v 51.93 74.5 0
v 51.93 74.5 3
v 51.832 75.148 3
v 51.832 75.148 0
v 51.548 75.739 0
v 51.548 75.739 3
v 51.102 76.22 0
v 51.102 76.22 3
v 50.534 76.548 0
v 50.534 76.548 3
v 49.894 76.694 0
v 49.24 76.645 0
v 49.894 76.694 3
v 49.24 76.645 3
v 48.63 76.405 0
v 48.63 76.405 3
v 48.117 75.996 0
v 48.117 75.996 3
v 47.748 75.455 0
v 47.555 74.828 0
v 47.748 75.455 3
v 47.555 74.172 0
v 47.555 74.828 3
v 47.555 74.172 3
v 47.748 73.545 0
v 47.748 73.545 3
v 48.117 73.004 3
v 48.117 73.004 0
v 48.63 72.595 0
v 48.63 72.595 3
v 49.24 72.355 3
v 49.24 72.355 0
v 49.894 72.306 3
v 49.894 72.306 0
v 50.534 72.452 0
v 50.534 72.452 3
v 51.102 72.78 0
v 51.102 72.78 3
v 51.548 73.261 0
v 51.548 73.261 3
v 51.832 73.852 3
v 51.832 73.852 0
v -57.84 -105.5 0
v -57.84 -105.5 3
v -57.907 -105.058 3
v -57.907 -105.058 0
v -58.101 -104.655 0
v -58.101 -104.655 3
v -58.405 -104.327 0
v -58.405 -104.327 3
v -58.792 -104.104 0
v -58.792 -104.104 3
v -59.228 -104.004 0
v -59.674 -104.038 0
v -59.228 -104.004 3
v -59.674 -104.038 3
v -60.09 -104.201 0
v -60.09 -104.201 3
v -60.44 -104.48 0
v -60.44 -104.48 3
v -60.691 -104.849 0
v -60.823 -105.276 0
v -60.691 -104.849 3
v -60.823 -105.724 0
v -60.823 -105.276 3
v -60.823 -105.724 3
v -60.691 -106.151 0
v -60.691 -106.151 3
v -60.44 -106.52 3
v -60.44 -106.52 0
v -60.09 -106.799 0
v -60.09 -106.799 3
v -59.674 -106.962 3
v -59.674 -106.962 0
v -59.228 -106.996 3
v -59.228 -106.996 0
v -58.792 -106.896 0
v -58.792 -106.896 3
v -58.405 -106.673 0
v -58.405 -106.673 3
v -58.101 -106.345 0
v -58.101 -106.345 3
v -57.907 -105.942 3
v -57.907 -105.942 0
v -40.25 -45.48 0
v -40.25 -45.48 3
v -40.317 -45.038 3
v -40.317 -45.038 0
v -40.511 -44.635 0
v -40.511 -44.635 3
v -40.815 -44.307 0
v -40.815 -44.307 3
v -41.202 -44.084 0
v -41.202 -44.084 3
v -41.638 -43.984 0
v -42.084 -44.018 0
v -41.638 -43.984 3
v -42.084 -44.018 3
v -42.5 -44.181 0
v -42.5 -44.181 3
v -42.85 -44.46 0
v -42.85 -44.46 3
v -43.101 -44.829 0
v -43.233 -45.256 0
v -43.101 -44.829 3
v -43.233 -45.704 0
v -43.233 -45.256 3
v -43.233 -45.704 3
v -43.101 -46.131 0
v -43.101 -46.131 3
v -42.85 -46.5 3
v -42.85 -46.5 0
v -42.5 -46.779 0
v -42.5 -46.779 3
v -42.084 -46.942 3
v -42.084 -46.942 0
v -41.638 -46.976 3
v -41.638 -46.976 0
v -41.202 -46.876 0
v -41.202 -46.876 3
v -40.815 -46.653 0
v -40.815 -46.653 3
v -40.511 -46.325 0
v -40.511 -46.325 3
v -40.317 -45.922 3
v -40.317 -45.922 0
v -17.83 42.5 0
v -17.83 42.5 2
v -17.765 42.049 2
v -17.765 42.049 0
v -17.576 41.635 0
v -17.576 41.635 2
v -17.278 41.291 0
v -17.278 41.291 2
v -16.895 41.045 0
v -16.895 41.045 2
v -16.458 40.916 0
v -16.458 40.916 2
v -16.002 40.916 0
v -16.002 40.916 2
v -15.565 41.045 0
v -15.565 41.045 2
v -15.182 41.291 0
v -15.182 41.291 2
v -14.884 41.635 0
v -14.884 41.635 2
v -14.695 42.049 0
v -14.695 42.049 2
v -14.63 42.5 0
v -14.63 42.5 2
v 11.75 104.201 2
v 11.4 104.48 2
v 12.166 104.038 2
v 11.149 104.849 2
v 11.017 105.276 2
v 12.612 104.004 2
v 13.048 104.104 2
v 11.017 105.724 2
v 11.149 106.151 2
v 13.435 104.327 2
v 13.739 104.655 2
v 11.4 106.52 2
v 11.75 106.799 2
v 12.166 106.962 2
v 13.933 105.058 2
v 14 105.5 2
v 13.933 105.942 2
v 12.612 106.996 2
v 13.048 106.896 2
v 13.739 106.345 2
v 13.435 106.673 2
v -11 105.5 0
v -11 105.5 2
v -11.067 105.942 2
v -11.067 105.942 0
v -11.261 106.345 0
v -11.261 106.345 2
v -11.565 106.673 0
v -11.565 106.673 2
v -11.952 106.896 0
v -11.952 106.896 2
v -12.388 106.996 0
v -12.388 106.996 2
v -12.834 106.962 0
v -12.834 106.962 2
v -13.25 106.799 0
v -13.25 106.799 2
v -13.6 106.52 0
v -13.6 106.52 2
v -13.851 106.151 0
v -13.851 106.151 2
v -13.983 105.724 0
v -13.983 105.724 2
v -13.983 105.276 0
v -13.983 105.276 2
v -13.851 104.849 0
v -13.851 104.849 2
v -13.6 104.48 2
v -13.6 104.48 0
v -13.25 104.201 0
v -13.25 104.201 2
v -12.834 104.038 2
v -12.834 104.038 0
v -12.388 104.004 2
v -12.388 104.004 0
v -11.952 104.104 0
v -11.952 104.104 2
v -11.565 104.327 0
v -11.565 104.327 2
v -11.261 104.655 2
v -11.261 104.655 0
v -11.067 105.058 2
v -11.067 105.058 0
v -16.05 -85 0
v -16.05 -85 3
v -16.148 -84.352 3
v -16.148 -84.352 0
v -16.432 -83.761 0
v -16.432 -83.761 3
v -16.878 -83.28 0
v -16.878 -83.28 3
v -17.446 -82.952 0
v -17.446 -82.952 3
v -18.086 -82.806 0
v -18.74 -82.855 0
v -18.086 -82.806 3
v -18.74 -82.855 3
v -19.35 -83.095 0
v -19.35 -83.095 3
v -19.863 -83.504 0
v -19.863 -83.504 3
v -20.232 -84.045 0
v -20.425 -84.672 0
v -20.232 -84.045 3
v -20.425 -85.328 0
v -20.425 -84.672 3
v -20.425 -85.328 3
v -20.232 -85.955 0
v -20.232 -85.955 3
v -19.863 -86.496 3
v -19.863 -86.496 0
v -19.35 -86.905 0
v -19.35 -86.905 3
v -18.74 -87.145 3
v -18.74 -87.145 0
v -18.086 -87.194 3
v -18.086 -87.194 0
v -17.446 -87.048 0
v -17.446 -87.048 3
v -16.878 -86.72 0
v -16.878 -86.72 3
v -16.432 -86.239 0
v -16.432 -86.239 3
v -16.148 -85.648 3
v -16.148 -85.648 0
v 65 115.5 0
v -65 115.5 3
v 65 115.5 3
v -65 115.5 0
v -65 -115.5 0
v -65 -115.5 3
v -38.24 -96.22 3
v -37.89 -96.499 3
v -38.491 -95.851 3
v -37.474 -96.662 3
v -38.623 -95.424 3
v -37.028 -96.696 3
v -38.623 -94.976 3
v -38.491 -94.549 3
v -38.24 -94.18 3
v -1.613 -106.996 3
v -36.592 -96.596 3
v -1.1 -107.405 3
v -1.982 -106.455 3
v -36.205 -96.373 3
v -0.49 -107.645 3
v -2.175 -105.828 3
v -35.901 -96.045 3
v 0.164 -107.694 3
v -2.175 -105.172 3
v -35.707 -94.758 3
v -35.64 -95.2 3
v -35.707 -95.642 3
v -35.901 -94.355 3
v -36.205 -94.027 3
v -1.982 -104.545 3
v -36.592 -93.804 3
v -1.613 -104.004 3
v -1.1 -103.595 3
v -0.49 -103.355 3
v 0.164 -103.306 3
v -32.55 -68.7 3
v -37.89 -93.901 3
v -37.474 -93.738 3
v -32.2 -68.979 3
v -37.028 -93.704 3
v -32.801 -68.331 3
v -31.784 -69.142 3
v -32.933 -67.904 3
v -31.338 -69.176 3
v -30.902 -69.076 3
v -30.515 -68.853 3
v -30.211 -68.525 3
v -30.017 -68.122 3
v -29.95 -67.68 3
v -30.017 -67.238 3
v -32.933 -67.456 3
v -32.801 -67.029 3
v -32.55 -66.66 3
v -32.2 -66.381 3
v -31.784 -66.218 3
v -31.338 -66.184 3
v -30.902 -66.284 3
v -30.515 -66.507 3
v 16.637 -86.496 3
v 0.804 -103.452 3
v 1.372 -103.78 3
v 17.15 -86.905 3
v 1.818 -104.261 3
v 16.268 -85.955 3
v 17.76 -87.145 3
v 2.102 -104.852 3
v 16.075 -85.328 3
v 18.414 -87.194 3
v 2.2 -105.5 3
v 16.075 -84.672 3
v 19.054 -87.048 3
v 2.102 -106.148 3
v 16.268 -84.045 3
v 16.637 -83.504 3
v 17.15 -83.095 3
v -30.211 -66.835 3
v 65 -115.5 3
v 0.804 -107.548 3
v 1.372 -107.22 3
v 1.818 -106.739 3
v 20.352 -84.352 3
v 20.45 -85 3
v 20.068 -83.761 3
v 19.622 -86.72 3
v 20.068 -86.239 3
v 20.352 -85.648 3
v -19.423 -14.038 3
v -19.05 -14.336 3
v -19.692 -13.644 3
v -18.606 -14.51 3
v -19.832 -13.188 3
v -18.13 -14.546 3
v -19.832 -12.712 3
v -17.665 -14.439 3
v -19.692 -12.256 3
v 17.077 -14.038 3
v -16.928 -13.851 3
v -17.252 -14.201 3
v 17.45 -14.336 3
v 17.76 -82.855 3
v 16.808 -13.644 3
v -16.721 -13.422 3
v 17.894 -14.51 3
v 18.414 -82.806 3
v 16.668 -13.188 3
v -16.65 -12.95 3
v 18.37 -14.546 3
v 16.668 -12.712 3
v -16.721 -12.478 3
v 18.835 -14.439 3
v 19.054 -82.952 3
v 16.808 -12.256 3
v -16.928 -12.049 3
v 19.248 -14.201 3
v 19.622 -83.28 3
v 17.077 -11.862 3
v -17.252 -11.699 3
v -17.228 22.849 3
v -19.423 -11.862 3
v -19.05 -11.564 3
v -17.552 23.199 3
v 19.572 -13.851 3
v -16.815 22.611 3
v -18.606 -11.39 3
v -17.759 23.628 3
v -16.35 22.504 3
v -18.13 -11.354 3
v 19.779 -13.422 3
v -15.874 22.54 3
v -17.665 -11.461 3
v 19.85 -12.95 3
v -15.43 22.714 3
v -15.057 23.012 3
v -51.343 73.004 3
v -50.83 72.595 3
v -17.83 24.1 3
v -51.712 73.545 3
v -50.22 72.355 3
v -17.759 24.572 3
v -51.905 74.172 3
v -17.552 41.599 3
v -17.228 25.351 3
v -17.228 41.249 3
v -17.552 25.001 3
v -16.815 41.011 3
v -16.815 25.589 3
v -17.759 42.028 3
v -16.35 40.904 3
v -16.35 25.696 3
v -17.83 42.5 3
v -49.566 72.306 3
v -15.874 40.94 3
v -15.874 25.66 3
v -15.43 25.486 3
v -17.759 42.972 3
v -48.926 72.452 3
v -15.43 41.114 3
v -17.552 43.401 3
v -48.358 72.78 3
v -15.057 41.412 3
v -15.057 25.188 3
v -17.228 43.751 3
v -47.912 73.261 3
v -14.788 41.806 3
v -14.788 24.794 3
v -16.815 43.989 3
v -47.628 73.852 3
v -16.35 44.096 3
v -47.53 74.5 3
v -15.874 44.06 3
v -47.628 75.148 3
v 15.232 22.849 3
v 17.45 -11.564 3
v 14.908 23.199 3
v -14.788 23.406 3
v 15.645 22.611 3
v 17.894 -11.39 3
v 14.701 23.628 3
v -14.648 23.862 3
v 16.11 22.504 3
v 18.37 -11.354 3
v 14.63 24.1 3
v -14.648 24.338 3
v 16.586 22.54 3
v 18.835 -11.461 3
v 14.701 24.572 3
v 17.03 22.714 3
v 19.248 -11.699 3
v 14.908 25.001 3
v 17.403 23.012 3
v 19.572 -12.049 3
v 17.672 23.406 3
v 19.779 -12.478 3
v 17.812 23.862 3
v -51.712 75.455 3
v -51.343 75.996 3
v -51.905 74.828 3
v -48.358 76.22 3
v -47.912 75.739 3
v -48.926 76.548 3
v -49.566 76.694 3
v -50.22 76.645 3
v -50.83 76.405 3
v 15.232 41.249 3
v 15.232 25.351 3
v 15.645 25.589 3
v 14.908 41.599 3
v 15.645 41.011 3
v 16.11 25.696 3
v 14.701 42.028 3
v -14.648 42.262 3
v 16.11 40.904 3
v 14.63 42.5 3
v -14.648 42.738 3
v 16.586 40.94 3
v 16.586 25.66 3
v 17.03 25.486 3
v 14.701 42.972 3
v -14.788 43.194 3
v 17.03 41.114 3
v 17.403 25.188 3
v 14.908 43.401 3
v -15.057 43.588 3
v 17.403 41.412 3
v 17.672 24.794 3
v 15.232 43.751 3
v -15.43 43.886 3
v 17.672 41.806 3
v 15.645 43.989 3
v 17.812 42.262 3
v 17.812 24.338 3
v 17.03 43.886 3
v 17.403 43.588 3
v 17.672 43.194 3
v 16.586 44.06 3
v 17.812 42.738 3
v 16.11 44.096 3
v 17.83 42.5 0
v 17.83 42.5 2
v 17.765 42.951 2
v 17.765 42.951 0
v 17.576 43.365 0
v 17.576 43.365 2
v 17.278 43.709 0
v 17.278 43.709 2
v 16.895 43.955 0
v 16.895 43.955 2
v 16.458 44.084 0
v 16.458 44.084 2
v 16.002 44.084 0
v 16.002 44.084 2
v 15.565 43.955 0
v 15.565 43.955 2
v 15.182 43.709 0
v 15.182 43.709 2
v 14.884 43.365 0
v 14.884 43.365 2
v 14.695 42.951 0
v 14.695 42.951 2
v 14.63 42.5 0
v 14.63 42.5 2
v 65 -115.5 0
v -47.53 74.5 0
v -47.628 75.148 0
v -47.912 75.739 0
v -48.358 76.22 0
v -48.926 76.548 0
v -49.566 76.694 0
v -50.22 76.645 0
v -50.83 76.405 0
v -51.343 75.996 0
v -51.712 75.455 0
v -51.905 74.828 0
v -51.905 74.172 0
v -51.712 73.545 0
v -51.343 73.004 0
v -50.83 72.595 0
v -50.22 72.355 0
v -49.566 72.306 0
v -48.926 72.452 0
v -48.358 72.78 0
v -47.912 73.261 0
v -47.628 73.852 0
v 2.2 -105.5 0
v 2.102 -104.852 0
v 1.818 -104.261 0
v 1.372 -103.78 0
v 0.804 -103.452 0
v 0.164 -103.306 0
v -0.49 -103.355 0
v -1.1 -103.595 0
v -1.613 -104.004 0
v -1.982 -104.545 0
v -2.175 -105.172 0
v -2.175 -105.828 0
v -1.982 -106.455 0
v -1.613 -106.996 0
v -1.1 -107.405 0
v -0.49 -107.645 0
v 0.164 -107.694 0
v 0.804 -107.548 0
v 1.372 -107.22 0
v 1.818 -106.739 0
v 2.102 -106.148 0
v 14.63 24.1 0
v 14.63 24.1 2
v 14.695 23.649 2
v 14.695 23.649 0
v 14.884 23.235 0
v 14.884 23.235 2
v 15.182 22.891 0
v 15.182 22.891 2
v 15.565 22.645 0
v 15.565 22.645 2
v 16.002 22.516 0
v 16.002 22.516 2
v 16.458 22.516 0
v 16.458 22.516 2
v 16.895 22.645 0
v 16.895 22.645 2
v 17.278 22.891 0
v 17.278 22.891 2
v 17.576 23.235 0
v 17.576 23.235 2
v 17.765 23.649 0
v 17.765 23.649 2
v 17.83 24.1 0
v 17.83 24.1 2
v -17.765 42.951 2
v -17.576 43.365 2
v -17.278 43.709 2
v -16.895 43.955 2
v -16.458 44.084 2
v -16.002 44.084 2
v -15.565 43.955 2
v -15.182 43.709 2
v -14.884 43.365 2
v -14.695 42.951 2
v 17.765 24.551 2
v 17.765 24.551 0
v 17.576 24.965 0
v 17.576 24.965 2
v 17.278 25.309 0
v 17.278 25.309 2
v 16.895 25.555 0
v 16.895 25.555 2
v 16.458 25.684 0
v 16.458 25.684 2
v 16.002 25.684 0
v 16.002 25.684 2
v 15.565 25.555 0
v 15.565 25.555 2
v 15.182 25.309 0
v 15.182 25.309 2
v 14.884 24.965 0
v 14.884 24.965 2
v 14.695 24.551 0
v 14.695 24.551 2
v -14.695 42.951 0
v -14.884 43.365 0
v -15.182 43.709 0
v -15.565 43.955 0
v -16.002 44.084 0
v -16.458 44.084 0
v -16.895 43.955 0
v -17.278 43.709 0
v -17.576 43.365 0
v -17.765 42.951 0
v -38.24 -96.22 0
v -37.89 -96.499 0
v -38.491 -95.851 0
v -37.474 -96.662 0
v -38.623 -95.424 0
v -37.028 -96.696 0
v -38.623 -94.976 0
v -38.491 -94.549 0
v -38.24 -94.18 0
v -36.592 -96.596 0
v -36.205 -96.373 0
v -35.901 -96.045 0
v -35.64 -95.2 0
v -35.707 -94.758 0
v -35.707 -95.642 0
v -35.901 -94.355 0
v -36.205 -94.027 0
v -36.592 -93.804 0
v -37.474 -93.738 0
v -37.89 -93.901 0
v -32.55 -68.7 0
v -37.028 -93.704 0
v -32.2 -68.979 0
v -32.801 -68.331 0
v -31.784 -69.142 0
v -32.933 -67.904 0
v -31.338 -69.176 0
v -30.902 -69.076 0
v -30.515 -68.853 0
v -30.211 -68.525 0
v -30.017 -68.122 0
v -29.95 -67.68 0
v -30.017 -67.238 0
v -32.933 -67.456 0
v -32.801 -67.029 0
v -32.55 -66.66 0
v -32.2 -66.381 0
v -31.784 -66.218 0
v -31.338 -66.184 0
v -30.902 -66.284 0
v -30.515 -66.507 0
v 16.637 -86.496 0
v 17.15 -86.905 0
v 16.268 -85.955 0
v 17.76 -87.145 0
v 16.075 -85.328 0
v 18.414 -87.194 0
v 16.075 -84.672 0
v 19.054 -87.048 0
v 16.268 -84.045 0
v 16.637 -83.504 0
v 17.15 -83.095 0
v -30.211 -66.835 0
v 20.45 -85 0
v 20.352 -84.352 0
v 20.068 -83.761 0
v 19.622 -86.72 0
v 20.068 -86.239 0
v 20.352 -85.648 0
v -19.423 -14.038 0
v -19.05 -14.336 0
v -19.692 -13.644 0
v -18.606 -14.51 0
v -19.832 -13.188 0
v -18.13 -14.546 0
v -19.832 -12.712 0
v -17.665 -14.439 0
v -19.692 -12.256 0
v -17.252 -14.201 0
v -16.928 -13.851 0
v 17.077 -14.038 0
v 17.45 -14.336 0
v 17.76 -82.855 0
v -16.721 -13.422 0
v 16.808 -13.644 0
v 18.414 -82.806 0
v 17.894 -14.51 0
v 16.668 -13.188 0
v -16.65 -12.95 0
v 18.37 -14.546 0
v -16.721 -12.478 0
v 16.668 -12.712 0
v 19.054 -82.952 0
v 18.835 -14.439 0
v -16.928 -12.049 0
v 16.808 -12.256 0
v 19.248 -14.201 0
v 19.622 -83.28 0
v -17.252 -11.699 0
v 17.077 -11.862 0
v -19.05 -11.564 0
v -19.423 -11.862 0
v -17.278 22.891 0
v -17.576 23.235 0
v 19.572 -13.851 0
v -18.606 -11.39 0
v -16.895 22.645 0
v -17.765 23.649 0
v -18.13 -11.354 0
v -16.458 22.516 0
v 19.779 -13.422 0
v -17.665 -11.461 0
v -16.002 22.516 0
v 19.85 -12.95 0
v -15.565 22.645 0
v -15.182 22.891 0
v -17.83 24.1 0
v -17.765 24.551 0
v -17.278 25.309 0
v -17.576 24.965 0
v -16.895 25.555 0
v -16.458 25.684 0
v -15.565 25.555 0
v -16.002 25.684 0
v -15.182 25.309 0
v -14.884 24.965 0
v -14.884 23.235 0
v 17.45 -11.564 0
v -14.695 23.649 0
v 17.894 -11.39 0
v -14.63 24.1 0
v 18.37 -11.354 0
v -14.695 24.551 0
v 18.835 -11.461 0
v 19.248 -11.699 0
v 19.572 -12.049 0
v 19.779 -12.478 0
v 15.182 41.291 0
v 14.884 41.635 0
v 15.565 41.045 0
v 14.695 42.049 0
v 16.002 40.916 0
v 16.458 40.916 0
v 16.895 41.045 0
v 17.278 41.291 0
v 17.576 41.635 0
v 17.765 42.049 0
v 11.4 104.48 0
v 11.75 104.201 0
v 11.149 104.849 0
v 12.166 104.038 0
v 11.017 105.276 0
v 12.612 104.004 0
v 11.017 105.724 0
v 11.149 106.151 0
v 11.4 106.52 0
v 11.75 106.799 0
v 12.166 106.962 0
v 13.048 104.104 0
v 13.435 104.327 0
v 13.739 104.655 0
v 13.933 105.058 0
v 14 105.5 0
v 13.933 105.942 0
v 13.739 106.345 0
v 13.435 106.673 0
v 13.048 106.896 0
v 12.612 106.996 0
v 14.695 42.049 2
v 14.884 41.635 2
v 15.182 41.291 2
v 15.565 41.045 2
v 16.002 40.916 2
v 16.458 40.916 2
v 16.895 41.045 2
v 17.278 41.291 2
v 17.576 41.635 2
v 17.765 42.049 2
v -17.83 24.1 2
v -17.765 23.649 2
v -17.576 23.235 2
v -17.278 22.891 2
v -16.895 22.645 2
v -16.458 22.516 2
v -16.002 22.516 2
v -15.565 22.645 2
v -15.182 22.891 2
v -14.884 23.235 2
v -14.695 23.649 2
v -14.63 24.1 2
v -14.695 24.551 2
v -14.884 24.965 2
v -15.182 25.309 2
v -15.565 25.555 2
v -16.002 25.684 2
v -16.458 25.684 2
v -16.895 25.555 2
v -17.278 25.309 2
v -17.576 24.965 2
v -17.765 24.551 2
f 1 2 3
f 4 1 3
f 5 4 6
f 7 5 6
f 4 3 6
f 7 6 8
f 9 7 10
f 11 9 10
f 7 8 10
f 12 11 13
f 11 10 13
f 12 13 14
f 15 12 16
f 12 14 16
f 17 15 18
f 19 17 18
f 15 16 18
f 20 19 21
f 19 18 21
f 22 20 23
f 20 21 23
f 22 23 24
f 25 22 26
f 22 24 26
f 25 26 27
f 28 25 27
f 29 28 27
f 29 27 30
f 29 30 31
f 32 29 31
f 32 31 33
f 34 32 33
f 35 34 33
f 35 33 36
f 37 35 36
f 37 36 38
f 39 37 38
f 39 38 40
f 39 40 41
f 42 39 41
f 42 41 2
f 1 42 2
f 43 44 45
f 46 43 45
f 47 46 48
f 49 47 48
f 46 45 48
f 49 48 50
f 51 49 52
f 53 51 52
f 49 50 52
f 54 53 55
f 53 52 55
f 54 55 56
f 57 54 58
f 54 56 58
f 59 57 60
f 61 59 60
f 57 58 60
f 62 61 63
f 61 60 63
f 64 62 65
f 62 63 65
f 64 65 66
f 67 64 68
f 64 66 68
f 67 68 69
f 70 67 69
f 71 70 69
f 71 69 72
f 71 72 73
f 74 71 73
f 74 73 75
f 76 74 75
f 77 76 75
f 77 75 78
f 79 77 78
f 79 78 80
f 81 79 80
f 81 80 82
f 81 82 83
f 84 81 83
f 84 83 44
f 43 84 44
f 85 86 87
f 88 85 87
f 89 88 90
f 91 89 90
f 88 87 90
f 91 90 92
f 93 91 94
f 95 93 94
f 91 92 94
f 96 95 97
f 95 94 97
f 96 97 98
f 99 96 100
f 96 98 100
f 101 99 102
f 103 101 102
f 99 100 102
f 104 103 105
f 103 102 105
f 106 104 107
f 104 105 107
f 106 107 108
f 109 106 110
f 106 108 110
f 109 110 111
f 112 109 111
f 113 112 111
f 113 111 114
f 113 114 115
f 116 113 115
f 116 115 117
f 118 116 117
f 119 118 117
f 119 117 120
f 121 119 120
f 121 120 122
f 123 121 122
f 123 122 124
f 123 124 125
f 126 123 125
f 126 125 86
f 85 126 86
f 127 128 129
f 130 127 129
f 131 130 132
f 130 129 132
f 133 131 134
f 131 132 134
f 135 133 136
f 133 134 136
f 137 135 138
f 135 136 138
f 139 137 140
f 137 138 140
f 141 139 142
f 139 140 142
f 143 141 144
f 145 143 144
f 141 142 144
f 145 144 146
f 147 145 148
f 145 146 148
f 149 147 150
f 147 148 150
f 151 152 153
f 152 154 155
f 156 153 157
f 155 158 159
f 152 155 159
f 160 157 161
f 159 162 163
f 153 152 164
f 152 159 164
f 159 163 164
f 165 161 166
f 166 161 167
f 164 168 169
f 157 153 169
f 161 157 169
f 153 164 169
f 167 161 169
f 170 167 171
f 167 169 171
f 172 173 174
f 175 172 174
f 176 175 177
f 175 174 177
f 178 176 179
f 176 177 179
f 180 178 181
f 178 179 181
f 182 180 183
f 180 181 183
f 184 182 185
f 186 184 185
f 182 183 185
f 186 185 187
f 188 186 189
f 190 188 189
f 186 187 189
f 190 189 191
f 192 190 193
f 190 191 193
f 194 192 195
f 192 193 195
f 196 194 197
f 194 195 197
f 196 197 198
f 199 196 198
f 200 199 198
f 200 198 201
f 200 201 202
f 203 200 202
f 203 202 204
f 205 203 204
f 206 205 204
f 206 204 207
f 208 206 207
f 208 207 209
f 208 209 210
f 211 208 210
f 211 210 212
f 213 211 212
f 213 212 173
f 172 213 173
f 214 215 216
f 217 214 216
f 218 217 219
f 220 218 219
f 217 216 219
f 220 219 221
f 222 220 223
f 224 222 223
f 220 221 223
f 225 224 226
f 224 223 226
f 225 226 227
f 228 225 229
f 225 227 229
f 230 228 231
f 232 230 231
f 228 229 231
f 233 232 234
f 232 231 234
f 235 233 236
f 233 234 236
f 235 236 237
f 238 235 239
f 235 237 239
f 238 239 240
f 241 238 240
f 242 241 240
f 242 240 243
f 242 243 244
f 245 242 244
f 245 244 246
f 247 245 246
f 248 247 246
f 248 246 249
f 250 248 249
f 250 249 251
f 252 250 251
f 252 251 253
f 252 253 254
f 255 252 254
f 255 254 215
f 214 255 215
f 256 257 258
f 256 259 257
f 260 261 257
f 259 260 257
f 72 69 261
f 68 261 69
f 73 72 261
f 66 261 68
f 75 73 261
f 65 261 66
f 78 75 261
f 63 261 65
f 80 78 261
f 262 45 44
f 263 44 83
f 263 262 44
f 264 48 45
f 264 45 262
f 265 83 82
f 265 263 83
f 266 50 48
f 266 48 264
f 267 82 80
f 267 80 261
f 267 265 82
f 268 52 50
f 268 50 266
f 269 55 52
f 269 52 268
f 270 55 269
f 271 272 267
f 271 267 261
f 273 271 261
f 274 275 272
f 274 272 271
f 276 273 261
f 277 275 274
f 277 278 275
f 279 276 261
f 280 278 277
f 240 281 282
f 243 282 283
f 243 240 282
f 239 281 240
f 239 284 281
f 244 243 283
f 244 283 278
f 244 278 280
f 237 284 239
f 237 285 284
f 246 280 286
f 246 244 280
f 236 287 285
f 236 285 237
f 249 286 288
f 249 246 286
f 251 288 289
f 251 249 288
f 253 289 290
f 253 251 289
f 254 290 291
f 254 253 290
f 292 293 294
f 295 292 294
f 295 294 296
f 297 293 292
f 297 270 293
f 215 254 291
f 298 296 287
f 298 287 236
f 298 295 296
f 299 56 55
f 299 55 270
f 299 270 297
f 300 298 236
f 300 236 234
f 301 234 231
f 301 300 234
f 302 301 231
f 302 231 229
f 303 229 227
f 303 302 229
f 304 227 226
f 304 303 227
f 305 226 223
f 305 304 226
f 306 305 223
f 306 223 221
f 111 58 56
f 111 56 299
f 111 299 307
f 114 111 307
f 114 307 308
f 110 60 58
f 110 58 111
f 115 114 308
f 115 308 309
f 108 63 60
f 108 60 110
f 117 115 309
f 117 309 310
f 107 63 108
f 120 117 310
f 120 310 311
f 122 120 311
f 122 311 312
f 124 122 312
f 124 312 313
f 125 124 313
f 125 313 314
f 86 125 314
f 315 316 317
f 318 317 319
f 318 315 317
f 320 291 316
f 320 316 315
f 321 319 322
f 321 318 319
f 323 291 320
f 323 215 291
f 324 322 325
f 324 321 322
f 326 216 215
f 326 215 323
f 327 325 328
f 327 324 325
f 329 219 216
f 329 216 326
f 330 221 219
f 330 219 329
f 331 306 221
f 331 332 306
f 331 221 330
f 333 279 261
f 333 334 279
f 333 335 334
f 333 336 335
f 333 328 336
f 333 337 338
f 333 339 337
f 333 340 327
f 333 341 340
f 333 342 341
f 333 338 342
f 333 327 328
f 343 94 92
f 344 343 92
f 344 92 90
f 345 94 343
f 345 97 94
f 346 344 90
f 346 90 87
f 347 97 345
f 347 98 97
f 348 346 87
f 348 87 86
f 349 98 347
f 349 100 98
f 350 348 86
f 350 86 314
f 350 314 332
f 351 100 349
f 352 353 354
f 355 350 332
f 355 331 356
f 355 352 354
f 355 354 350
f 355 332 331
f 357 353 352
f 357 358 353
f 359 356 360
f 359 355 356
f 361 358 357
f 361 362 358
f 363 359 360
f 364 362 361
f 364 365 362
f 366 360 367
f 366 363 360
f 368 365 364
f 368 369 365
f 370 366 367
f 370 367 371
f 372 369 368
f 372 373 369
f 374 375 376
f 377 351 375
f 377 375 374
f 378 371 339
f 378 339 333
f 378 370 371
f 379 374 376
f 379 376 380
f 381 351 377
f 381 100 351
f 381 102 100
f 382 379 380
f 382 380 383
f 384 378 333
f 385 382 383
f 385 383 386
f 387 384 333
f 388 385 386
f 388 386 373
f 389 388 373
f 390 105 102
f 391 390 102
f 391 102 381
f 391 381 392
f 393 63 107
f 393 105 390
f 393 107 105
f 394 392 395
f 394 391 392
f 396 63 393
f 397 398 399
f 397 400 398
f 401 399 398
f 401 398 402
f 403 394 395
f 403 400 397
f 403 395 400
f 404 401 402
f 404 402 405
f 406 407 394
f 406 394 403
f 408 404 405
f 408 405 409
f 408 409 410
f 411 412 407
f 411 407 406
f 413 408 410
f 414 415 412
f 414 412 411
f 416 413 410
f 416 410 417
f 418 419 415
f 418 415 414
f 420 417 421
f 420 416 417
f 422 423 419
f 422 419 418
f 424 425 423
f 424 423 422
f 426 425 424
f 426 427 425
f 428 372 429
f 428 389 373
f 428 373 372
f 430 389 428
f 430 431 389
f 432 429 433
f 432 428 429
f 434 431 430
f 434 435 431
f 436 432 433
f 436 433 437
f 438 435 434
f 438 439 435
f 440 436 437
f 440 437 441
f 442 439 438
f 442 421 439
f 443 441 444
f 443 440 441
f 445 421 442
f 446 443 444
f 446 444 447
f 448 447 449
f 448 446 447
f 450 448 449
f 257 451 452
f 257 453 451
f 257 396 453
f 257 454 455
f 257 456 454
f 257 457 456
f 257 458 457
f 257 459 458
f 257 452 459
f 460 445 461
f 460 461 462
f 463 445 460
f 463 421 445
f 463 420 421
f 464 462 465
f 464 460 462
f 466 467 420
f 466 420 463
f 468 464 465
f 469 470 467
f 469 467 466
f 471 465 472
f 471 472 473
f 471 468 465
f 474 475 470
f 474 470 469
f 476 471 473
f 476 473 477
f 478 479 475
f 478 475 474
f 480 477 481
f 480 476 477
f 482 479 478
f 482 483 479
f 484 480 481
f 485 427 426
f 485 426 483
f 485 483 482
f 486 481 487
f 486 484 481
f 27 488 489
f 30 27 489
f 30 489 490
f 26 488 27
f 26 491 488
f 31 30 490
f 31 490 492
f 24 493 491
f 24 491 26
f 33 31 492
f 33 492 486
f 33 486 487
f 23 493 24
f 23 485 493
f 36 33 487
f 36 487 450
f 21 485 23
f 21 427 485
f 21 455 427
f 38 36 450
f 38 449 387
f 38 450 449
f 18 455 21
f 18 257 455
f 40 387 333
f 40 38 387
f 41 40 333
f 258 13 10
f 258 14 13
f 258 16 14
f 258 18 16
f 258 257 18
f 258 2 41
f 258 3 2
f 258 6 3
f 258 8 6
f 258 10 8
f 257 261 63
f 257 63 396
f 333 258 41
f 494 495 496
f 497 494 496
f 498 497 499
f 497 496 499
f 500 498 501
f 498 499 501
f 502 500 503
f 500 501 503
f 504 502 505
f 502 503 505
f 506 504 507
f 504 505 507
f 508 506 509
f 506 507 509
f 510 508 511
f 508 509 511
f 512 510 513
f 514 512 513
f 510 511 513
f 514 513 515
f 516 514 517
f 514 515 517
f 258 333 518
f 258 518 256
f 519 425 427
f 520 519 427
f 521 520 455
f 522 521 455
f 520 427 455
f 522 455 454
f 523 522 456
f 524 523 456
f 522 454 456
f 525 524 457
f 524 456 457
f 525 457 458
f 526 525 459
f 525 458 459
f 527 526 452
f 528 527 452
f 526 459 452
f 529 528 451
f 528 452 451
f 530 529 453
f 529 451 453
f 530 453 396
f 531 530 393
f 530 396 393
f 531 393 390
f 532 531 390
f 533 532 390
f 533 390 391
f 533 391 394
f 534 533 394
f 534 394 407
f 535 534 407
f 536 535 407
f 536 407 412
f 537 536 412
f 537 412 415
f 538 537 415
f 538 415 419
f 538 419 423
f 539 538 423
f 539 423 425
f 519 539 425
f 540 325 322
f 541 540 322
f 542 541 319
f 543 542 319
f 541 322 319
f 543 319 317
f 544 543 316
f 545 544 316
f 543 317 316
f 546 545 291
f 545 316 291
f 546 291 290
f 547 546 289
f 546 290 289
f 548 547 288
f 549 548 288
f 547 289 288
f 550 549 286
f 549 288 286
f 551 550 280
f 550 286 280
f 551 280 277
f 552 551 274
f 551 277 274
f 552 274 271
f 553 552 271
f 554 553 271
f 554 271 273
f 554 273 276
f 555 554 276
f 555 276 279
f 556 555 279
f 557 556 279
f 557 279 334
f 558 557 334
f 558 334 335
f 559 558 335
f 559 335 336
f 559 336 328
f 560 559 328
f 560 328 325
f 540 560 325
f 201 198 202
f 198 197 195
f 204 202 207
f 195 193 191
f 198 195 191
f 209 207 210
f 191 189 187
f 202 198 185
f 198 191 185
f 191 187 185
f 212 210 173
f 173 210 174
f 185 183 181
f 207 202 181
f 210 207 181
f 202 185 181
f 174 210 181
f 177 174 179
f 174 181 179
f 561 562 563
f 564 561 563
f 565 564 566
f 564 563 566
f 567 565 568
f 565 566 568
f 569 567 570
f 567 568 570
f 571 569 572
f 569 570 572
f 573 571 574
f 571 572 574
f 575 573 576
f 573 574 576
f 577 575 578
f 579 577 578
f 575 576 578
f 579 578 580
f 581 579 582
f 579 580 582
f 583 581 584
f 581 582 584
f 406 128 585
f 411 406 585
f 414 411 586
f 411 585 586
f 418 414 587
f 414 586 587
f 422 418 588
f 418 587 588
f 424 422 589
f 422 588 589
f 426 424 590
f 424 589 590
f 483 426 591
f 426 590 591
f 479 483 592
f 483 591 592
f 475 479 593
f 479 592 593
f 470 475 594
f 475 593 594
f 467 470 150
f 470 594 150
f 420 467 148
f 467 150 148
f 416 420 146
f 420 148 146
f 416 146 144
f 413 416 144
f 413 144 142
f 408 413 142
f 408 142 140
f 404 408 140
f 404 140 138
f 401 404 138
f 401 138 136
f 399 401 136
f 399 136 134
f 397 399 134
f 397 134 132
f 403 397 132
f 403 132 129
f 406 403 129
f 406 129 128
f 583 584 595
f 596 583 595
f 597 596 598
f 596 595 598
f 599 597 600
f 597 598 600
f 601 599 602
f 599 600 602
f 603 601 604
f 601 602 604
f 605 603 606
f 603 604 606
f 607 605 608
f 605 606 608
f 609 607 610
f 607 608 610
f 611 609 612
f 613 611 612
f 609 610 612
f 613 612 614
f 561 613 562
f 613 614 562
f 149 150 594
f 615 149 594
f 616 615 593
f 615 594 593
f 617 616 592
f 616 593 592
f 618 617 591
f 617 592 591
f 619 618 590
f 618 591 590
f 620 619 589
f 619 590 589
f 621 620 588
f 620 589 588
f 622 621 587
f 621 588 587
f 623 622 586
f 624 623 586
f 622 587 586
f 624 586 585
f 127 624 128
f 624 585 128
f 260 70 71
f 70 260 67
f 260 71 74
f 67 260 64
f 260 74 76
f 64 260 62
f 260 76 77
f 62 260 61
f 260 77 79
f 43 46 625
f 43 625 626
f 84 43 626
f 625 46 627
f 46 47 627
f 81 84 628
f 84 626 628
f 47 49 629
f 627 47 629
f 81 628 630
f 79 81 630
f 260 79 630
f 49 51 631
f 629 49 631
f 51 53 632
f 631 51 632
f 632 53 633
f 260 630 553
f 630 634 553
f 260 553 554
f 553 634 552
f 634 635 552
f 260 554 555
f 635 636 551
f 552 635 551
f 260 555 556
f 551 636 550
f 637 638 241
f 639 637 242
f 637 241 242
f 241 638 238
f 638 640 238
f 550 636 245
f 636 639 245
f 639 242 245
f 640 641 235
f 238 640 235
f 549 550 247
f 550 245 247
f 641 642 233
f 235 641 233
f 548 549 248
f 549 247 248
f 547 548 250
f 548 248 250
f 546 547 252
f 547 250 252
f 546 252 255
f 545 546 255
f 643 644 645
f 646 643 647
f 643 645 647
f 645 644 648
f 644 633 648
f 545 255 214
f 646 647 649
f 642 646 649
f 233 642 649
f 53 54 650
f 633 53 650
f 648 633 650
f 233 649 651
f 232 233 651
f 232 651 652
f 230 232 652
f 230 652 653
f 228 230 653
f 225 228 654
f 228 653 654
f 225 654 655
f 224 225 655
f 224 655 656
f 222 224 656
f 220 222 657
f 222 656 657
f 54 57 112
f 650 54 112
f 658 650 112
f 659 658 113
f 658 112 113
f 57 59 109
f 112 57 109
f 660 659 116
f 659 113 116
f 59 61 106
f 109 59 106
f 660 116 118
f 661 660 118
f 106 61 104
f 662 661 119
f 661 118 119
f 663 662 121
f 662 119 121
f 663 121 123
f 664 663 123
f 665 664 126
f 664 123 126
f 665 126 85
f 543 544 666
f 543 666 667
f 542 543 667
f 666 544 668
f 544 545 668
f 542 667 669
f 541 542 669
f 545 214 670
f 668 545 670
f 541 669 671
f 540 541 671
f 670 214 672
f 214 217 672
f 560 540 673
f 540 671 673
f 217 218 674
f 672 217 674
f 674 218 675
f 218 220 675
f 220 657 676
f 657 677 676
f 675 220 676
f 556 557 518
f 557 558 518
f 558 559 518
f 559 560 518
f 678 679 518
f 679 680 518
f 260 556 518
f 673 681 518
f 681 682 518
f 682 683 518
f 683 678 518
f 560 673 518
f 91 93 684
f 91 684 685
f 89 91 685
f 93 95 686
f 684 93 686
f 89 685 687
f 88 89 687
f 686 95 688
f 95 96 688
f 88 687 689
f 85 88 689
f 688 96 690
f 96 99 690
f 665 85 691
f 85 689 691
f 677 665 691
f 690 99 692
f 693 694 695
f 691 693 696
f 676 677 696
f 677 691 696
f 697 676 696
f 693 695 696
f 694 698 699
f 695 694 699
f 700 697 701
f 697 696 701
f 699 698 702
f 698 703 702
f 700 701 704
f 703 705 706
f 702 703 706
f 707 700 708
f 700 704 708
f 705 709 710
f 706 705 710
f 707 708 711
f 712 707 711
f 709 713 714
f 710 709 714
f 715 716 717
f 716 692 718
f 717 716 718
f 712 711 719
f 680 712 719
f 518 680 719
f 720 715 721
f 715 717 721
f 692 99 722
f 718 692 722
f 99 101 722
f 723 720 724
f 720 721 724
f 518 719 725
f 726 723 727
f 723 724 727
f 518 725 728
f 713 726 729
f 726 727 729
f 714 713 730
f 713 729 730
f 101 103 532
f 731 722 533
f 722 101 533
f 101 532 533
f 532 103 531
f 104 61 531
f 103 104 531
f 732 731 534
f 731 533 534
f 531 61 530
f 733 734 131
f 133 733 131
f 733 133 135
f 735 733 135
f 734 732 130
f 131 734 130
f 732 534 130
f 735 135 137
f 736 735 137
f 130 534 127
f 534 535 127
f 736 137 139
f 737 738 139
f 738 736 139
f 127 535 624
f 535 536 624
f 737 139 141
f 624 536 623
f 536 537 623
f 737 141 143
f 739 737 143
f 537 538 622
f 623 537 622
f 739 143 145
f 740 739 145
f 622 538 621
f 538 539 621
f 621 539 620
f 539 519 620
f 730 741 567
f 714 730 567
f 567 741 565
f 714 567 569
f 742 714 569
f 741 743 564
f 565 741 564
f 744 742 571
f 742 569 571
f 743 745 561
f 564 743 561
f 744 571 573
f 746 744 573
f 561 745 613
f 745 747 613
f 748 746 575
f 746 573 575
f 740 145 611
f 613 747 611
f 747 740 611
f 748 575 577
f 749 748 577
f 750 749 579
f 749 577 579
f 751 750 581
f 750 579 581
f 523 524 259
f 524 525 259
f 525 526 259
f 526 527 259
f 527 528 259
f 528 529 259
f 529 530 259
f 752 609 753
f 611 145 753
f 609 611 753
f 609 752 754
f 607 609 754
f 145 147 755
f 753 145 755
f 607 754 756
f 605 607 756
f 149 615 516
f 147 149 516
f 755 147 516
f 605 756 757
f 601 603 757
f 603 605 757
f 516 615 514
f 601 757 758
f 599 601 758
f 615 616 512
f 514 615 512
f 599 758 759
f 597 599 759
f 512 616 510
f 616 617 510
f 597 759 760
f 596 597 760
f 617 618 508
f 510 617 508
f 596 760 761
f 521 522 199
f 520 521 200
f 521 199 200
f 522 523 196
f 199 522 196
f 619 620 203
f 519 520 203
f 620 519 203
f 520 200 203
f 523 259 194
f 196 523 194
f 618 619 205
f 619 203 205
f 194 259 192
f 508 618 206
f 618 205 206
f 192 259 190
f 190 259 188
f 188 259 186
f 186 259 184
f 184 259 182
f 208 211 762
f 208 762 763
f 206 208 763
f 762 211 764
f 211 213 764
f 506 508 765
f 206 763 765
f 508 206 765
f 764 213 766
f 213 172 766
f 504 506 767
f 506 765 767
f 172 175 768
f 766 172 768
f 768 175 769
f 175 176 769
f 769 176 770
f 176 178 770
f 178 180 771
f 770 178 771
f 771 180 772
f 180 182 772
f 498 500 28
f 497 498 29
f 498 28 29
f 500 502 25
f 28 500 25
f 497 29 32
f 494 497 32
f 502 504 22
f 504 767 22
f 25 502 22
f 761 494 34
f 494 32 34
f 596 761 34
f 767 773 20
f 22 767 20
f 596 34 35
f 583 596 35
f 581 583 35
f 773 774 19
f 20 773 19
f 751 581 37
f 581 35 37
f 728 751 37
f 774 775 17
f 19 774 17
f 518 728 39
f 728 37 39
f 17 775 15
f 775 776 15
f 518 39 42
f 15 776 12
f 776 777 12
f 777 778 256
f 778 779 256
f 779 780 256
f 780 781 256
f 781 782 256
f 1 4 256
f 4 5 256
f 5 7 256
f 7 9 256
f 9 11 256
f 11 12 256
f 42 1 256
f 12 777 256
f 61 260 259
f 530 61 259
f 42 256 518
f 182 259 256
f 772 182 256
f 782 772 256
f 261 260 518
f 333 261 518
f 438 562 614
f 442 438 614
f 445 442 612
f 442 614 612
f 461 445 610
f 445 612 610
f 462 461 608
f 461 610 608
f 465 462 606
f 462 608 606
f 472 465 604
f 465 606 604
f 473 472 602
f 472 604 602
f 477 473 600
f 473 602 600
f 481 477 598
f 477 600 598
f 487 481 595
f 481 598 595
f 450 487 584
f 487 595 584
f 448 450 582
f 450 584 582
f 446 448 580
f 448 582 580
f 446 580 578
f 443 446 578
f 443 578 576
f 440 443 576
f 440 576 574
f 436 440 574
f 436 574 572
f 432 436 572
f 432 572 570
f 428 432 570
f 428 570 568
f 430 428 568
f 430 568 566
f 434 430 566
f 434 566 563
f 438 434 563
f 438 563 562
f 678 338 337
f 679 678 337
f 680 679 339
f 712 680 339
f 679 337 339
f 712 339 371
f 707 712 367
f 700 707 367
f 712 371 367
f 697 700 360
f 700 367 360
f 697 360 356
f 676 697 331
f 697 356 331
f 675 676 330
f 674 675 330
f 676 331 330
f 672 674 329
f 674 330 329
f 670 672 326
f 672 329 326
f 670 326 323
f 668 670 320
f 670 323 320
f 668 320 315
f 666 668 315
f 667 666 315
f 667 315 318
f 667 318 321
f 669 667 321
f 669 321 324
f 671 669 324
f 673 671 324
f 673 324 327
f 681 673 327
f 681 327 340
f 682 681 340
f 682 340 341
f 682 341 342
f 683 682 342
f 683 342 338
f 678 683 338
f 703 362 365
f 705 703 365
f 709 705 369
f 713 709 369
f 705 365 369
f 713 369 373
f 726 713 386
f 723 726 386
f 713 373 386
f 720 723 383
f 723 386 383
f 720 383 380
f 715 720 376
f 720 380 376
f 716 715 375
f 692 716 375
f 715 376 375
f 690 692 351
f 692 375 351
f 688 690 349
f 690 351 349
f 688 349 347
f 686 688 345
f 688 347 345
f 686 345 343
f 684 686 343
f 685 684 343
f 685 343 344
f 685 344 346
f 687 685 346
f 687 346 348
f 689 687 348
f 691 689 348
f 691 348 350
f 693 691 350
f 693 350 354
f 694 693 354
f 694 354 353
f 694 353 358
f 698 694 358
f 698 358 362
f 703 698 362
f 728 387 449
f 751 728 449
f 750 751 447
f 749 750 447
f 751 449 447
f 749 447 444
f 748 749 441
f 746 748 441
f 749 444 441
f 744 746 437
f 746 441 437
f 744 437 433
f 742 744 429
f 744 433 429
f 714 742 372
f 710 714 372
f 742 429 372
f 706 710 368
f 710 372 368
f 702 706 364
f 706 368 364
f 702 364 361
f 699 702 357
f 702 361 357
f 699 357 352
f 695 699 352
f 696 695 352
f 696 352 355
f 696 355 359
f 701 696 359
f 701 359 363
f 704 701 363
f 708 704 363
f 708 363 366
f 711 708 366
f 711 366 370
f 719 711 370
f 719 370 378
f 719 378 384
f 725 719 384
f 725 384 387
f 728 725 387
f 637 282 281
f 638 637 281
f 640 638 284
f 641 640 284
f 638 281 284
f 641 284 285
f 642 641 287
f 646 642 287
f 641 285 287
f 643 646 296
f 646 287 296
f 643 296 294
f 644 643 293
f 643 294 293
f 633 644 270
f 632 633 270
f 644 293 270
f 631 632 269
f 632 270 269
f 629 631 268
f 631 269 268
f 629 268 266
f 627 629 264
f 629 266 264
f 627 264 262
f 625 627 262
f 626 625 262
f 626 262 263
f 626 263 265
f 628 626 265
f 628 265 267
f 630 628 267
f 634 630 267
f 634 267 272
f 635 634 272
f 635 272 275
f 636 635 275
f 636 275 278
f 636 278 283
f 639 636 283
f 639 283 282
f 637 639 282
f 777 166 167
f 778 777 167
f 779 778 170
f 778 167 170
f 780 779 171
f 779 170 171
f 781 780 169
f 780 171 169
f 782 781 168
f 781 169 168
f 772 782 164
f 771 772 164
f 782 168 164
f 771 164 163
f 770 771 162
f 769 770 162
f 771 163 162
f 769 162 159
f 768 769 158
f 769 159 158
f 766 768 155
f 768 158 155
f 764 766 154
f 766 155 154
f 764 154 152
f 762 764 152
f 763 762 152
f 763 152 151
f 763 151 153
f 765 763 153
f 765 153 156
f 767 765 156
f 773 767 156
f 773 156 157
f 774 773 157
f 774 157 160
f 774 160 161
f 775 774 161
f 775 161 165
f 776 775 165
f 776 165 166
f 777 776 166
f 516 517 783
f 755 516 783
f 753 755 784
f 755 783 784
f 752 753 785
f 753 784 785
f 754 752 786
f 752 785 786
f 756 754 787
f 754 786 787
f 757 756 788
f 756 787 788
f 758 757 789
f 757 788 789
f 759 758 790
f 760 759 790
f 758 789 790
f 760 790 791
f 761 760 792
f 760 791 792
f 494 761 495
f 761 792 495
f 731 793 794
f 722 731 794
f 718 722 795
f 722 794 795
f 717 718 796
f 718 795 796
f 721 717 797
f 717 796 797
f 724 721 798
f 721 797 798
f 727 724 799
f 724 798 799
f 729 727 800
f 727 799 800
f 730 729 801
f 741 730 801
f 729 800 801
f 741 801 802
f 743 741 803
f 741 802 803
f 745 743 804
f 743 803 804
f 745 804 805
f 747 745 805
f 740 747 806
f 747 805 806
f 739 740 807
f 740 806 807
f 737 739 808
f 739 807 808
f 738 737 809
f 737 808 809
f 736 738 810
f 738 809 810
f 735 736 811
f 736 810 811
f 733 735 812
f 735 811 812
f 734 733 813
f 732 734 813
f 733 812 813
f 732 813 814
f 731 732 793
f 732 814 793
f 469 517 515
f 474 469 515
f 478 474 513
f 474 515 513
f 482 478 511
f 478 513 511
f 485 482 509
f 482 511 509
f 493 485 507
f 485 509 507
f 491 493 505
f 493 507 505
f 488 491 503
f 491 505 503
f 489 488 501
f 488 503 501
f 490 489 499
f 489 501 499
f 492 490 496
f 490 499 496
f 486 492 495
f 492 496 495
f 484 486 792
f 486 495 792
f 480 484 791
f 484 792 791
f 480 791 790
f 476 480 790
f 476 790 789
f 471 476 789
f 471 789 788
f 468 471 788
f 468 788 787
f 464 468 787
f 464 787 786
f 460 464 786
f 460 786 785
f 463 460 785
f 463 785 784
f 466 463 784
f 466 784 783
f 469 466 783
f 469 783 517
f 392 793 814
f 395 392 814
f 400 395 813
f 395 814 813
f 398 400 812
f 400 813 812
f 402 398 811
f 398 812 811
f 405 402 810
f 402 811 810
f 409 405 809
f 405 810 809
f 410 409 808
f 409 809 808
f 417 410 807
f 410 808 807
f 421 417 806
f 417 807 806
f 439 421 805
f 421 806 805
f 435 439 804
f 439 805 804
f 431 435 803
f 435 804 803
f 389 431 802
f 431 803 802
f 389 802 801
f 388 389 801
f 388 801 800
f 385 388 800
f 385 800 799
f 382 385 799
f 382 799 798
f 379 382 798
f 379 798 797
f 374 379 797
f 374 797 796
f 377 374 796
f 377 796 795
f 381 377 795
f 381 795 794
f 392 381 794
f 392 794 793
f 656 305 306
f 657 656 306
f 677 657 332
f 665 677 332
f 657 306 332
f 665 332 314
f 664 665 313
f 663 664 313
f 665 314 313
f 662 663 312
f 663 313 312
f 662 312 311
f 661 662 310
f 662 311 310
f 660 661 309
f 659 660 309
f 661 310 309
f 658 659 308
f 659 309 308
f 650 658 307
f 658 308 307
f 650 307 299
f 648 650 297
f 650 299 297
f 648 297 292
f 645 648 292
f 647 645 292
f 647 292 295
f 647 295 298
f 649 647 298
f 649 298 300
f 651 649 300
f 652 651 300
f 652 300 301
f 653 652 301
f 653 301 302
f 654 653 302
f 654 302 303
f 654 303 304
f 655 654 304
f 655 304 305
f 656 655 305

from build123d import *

# Parameters (mm, degrees)
SKETCH_1_W               = 150
SKETCH_1_H               = 231
EXTRUDE_1_DEPTH          = 12.5
CUT_EXTRUDE_1_DEPTH      = 10.5
SKETCH_4_R               = 2.2
CUT_EXTRUDE_3_DEPTH      = 1
CUT_EXTRUDE_3_DEPTH_BACK = 13.5
SKETCH_5_R               = 2.2
SKETCH_5_R_2             = 1.6
SKETCH_5_R_3             = 1.5
CUT_EXTRUDE_4_DEPTH      = 13.5
SKETCH_6_R               = 1.5
CUT_EXTRUDE_5_DEPTH      = 10
SKETCH_3_R               = 1.6
CUT_EXTRUDE_6_DEPTH      = 10
SKETCH_7_W               = 10
SKETCH_7_H               = 231
CUT_EXTRUDE_7_DEPTH      = 13.5
SKETCH_8_W               = 10
SKETCH_8_H               = 231
CUT_EXTRUDE_8_DEPTH      = 13.5
SKETCH_9_W               = 43
SKETCH_9_H               = 102
EXTRUDE_2_DEPTH          = 10.5
SKETCH_10_R              = 1.6
CUT_EXTRUDE_9_DEPTH      = 30
SKETCH_11_W              = 130
SKETCH_11_H              = 231
CUT_EXTRUDE_10_DEPTH     = 9.5


with BuildPart() as part:
    # ｽｹｯﾁ1 → ﾎﾞｽ - 押し出し1 (new body)
    with BuildSketch(Plane.XY):
        Rectangle(SKETCH_1_W, SKETCH_1_H)
    extrude(amount=EXTRUDE_1_DEPTH)

    # ｽｹｯﾁ2 → ｶｯﾄ - 押し出し1 (cut)
    with BuildSketch(Plane.XY.offset(12.5)):
        Polygon((0, 115.5), (21.5, 115.5), (21.5, 13.5), (-21.5, 13.5), (-21.5, 115.5), align=None)
    extrude(amount=-CUT_EXTRUDE_1_DEPTH, mode=Mode.SUBTRACT)

    # ｽｹｯﾁ4 → ｶｯﾄ - 押し出し3 (cut, two sides)
    with BuildSketch(Plane.XY.offset(12.5)) as cut_extrude_3_sk:
        with Locations((-49.73, 74.5)):
            Circle(SKETCH_4_R)
        with Locations((49.73, 74.5)):
            Circle(SKETCH_4_R)
    extrude(amount=CUT_EXTRUDE_3_DEPTH, mode=Mode.SUBTRACT)
    extrude(cut_extrude_3_sk.sketch, amount=-CUT_EXTRUDE_3_DEPTH_BACK, mode=Mode.SUBTRACT)

    # ｽｹｯﾁ5 → ｶｯﾄ - 押し出し4 (cut, through all)
    with BuildSketch(Plane.XY.offset(12.5)):
        with Locations((18.25, -85)):
            Circle(SKETCH_5_R)
        with Locations((18.25, -12.95)):
            Circle(SKETCH_5_R_2)
        with Locations((-41.75, -45.48)):
            Circle(SKETCH_5_R_3)
        with Locations((-31.45, -67.68)):
            Circle(SKETCH_5_R_3)
        with Locations((-18.25, -85)):
            Circle(SKETCH_5_R)
        with Locations((-18.25, -12.95)):
            Circle(SKETCH_5_R_2)
        with Locations((0, -105.5)):
            Circle(SKETCH_5_R)
        with Locations((-59.34, -105.5)):
            Circle(SKETCH_5_R_3)
        with Locations((-37.14, -95.2)):
            Circle(SKETCH_5_R_3)
    extrude(amount=-CUT_EXTRUDE_4_DEPTH, mode=Mode.SUBTRACT)

    # ｽｹｯﾁ6 → ｶｯﾄ - 押し出し5 (cut)
    with BuildSketch(Plane.XY.offset(2)):
        with Locations((-12.5, 105.5)):
            Circle(SKETCH_6_R)
        with Locations((12.5, 105.5)):
            Circle(SKETCH_6_R)
    extrude(amount=-CUT_EXTRUDE_5_DEPTH, mode=Mode.SUBTRACT)

    # ｽｹｯﾁ3 → ｶｯﾄ - 押し出し6 (cut)
    with BuildSketch(Plane.XY.offset(2)):
        with Locations((-16.23, 42.5)):
            Circle(SKETCH_3_R)
        with Locations((16.23, 42.5)):
            Circle(SKETCH_3_R)
        with Locations((-16.23, 24.1)):
            Circle(SKETCH_3_R)
        with Locations((16.23, 24.1)):
            Circle(SKETCH_3_R)
    extrude(amount=-CUT_EXTRUDE_6_DEPTH, mode=Mode.SUBTRACT)

    # ｽｹｯﾁ7 → ｶｯﾄ - 押し出し7 (cut, through all)
    with BuildSketch(Plane.XY.offset(12.5)):
        with Locations((-70, 0)):
            Rectangle(SKETCH_7_W, SKETCH_7_H)
    extrude(amount=-CUT_EXTRUDE_7_DEPTH, mode=Mode.SUBTRACT)

    # ｽｹｯﾁ8 → ｶｯﾄ - 押し出し8 (cut, through all)
    with BuildSketch(Plane.XY.offset(12.5)):
        with Locations((70, 0)):
            Rectangle(SKETCH_8_W, SKETCH_8_H)
    extrude(amount=-CUT_EXTRUDE_8_DEPTH, mode=Mode.SUBTRACT)

    # ｽｹｯﾁ9 → ﾎﾞｽ - 押し出し2 (add)
    with BuildSketch(Plane.XY.offset(2)):
        with Locations((0, 64.5)):
            Rectangle(SKETCH_9_W, SKETCH_9_H)
    extrude(amount=EXTRUDE_2_DEPTH)

    # ｽｹｯﾁ10 → ｶｯﾄ - 押し出し9 (cut)
    with BuildSketch(Plane(origin=(0, 0, 0), x_dir=(-1, 0, 0), z_dir=(0, 0, -1))):
        with Locations((-16.23, 24.1)):
            Circle(SKETCH_10_R)
        with Locations((-16.23, 42.5)):
            Circle(SKETCH_10_R)
        with Locations((16.23, 42.5)):
            Circle(SKETCH_10_R)
        with Locations((16.23, 24.1)):
            Circle(SKETCH_10_R)
    extrude(amount=-CUT_EXTRUDE_9_DEPTH, mode=Mode.SUBTRACT)

    # ｽｹｯﾁ11 → ｶｯﾄ - 押し出し10 (cut)
    with BuildSketch(Plane.XY.offset(12.5)):
        Rectangle(SKETCH_11_W, SKETCH_11_H)
    extrude(amount=-CUT_EXTRUDE_10_DEPTH, mode=Mode.SUBTRACT)


solid = part.part
